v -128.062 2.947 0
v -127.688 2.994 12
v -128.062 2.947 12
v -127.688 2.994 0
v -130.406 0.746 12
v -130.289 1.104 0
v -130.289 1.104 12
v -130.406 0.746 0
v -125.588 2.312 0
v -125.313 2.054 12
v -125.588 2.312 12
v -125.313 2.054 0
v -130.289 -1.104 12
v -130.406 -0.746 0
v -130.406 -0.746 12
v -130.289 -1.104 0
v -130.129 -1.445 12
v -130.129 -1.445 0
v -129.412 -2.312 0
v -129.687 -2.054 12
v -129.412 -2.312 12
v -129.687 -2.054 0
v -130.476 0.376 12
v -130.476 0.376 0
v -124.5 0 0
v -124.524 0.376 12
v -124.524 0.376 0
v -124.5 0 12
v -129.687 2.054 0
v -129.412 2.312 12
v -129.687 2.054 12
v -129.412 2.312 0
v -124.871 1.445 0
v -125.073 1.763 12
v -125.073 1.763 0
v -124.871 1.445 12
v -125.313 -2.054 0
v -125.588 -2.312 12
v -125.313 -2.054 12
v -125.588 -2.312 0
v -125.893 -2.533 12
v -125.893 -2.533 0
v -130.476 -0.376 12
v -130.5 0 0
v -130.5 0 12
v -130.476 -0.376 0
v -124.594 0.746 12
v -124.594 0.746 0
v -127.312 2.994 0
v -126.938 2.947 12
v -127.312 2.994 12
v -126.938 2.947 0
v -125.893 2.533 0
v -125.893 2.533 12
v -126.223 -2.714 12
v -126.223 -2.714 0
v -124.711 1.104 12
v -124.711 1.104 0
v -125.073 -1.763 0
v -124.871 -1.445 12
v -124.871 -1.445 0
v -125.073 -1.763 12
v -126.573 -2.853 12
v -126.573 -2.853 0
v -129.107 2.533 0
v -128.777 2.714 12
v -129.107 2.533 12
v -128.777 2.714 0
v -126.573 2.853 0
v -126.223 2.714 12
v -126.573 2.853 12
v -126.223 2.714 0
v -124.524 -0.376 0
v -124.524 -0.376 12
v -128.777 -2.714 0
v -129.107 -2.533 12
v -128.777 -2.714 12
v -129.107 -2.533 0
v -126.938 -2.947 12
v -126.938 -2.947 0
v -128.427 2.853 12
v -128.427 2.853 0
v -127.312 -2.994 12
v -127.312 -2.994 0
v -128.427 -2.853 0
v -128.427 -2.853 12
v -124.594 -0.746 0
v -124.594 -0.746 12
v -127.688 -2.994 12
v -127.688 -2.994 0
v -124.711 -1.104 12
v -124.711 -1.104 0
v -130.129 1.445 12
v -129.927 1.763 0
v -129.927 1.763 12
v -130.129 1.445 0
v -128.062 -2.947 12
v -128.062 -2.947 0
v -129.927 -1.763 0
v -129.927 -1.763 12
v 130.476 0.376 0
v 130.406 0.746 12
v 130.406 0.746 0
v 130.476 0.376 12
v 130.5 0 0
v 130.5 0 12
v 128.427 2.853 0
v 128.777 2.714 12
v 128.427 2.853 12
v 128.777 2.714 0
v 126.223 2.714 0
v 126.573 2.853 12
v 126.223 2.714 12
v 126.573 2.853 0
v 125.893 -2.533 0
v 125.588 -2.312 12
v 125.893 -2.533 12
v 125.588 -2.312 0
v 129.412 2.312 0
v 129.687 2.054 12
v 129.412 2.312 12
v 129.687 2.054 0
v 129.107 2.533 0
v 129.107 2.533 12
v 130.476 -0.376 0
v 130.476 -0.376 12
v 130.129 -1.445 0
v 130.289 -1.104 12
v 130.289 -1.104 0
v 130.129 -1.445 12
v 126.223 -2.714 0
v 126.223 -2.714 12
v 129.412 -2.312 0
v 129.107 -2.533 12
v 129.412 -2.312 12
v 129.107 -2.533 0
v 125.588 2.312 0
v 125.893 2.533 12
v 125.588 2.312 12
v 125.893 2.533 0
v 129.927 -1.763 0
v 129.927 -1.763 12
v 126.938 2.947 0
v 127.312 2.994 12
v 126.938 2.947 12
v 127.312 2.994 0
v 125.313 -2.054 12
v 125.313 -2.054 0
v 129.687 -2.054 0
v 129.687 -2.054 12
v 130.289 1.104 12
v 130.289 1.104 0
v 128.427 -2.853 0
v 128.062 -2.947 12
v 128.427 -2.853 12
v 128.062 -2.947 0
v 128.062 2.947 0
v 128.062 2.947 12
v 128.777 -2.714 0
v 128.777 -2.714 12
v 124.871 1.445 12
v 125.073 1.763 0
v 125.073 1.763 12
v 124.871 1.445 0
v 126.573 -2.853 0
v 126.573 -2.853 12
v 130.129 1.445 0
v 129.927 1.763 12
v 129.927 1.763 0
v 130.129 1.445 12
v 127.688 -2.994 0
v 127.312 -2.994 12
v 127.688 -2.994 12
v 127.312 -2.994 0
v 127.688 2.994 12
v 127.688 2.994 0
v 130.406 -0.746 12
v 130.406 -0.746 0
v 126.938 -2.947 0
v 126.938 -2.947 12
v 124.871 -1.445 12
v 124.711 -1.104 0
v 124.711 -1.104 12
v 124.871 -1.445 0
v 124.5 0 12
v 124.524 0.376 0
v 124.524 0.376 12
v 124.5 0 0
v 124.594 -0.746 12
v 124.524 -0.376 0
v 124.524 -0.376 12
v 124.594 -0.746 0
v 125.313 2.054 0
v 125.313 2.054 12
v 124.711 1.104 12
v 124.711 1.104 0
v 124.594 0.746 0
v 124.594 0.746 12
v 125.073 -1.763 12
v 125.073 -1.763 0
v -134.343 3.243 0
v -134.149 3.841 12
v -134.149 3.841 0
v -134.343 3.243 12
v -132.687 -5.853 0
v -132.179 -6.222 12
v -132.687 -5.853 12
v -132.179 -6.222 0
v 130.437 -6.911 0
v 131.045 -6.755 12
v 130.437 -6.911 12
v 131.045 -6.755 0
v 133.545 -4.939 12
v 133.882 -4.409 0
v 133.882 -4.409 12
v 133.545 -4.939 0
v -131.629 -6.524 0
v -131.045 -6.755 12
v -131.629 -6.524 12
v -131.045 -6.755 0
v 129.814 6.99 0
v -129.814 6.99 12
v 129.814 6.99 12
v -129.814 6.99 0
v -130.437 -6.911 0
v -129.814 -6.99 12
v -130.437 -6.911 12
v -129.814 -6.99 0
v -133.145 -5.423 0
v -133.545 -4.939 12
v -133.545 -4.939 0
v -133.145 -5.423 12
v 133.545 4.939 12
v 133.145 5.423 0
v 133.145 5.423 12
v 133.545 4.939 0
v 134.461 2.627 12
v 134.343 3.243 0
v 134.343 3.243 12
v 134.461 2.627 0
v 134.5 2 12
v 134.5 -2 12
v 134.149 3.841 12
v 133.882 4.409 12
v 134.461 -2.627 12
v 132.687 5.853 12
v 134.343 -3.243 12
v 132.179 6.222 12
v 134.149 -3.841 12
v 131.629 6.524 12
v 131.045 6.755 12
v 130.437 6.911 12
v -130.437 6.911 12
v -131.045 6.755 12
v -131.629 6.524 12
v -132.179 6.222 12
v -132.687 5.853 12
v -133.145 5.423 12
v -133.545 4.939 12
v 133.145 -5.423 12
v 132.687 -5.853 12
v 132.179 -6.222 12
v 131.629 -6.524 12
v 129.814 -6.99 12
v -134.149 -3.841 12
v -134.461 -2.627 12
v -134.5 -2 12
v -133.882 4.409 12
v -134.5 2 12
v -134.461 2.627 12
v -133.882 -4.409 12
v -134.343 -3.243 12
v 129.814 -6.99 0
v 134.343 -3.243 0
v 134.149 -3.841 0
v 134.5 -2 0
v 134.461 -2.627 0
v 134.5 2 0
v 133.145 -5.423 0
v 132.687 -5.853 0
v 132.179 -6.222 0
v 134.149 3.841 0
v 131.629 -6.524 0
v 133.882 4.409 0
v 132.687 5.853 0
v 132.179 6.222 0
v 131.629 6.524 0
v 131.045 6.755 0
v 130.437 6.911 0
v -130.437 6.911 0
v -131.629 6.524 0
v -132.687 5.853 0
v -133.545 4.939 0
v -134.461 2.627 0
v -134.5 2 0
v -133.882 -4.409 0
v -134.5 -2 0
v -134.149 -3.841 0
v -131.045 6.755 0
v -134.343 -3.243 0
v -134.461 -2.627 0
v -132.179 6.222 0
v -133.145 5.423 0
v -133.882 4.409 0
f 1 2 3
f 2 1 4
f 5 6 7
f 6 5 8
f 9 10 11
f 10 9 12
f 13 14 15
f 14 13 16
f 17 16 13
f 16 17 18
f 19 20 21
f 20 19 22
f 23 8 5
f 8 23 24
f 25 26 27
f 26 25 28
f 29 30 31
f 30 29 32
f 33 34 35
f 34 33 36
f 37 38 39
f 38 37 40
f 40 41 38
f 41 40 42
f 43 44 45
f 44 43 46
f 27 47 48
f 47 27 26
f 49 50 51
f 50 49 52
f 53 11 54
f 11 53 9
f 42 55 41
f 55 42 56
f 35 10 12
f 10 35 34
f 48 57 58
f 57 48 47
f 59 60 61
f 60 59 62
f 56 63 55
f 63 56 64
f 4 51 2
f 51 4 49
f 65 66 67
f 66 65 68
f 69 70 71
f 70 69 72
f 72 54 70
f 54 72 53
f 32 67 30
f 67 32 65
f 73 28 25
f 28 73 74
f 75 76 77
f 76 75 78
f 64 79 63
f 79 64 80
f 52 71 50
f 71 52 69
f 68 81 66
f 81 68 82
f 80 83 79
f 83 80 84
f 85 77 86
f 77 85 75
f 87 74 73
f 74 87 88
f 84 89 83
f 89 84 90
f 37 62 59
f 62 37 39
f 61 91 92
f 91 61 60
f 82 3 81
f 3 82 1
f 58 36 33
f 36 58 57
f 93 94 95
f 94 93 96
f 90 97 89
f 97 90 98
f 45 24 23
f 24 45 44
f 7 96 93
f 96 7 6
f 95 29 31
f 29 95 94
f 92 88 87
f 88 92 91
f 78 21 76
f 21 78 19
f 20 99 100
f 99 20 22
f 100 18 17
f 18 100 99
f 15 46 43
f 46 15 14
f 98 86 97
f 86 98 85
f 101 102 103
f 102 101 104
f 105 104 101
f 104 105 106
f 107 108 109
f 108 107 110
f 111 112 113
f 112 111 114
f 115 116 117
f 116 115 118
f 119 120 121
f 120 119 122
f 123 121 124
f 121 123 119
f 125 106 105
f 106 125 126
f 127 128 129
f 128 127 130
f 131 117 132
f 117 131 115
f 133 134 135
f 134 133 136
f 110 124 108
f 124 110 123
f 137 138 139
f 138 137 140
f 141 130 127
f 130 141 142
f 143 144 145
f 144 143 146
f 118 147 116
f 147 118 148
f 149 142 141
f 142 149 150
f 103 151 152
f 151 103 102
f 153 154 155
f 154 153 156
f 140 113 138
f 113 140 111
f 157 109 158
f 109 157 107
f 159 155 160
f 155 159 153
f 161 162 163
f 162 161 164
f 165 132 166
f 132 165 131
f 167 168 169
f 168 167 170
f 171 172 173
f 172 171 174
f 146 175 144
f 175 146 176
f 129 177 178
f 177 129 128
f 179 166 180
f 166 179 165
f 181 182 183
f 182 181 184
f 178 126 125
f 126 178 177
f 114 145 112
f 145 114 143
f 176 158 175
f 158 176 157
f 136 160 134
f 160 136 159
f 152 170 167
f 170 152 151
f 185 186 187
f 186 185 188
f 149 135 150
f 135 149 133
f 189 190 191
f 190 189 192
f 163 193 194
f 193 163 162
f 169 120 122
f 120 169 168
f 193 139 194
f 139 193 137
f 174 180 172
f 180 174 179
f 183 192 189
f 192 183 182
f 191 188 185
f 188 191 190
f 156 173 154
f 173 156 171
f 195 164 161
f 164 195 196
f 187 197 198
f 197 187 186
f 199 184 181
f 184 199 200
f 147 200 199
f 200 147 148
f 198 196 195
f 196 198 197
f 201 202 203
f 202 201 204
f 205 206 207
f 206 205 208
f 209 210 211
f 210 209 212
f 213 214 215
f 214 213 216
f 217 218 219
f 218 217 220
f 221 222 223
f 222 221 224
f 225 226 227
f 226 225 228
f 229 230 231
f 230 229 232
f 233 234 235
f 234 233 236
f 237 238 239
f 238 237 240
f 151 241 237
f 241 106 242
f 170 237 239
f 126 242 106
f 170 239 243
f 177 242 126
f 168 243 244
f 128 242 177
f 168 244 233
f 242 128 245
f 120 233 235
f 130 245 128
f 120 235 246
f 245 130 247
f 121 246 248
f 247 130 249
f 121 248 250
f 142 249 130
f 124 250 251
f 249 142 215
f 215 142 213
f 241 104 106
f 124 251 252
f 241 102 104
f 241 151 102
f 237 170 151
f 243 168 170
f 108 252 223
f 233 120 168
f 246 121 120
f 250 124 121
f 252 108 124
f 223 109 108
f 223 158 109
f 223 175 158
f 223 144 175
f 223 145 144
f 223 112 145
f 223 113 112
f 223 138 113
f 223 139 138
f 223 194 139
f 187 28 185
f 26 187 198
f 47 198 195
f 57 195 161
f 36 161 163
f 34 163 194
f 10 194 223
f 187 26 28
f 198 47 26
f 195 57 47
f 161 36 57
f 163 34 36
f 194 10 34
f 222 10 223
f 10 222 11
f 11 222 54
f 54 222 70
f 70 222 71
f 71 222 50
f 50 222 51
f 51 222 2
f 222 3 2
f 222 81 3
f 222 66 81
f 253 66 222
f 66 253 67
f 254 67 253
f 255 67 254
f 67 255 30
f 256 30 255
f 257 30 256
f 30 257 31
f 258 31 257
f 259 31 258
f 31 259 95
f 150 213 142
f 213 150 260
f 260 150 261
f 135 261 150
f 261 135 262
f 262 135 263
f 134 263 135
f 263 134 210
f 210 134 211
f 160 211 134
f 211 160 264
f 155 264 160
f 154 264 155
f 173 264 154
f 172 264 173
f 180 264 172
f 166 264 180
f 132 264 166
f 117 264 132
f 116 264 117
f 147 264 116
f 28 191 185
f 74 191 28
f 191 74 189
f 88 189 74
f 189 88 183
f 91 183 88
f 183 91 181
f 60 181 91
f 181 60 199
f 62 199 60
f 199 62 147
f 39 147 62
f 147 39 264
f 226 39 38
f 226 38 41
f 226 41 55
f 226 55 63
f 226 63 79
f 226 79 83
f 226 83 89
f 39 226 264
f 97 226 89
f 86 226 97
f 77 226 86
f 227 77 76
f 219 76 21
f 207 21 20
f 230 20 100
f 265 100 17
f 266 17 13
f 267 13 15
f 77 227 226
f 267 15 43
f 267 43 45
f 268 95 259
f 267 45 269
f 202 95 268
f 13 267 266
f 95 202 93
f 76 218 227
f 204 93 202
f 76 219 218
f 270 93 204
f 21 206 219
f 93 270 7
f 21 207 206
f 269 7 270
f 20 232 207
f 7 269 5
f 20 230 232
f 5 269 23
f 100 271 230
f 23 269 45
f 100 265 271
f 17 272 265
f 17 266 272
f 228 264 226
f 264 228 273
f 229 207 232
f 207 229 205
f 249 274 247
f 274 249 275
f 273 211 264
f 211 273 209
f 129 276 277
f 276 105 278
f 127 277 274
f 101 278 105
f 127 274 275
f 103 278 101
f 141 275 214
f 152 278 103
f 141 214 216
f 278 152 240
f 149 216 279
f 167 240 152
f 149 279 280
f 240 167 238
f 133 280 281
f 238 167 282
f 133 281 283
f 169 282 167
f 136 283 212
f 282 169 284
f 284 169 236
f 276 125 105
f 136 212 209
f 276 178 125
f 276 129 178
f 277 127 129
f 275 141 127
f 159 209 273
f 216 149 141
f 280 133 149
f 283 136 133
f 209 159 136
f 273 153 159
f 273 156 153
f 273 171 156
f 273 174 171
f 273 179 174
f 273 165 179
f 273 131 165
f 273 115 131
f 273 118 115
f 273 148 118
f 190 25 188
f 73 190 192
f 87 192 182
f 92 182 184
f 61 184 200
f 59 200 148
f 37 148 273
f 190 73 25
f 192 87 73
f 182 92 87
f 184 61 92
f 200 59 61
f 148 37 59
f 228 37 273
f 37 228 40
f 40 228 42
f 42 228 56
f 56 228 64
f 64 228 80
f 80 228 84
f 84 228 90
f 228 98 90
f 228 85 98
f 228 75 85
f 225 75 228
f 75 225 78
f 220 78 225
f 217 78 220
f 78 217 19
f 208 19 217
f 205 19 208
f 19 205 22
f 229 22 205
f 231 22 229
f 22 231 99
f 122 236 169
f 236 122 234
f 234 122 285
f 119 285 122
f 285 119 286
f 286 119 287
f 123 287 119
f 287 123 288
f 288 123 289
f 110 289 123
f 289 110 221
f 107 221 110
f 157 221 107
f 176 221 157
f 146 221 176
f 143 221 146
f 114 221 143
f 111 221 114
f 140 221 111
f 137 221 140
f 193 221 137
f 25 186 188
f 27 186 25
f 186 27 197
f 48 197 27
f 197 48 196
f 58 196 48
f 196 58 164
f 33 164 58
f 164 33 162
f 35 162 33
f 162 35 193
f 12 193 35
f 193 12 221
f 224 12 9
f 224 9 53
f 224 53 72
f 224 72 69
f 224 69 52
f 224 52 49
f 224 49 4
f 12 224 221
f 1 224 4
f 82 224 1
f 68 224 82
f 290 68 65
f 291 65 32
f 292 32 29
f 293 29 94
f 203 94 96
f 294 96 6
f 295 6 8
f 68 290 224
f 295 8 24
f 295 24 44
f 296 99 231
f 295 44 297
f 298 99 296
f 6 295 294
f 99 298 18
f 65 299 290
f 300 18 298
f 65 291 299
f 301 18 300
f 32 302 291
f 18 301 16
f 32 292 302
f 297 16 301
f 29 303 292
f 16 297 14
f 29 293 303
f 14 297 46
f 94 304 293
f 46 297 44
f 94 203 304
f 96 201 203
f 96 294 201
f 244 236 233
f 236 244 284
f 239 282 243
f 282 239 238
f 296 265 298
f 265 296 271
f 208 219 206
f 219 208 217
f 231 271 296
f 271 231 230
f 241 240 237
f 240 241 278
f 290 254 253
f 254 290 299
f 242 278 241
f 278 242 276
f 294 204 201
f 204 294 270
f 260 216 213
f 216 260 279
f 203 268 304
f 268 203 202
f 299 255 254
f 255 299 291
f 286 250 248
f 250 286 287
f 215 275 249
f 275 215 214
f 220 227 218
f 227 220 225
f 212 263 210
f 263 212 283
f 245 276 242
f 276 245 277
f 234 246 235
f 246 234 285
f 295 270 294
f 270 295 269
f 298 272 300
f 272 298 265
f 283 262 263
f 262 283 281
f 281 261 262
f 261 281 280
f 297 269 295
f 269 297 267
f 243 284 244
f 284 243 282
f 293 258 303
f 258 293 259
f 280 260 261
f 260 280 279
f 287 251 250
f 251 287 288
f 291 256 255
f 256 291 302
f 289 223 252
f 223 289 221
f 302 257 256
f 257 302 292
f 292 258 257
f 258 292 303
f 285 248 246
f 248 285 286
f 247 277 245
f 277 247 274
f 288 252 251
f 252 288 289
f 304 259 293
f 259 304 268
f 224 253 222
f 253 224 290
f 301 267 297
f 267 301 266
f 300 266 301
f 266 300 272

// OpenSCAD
$fn = 50;


difference() {
	union() {
		hull() {
			translate(v = [-129.5000000000, 2.0000000000, 0]) {
				cylinder(h = 12, r = 5);
			}
			translate(v = [129.5000000000, 2.0000000000, 0]) {
				cylinder(h = 12, r = 5);
			}
			translate(v = [-129.5000000000, -2.0000000000, 0]) {
				cylinder(h = 12, r = 5);
			}
			translate(v = [129.5000000000, -2.0000000000, 0]) {
				cylinder(h = 12, r = 5);
			}
		}
	}
	union() {
		translate(v = [-127.5000000000, 0.0000000000, -100.0000000000]) {
			cylinder(h = 200, r = 3.0000000000);
		}
		translate(v = [-127.5000000000, 0.0000000000, -100.0000000000]) {
			cylinder(h = 200, r = 3.0000000000);
		}
		translate(v = [127.5000000000, 0.0000000000, -100.0000000000]) {
			cylinder(h = 200, r = 3.0000000000);
		}
		translate(v = [127.5000000000, 0.0000000000, -100.0000000000]) {
			cylinder(h = 200, r = 3.0000000000);
		}
	}
}
